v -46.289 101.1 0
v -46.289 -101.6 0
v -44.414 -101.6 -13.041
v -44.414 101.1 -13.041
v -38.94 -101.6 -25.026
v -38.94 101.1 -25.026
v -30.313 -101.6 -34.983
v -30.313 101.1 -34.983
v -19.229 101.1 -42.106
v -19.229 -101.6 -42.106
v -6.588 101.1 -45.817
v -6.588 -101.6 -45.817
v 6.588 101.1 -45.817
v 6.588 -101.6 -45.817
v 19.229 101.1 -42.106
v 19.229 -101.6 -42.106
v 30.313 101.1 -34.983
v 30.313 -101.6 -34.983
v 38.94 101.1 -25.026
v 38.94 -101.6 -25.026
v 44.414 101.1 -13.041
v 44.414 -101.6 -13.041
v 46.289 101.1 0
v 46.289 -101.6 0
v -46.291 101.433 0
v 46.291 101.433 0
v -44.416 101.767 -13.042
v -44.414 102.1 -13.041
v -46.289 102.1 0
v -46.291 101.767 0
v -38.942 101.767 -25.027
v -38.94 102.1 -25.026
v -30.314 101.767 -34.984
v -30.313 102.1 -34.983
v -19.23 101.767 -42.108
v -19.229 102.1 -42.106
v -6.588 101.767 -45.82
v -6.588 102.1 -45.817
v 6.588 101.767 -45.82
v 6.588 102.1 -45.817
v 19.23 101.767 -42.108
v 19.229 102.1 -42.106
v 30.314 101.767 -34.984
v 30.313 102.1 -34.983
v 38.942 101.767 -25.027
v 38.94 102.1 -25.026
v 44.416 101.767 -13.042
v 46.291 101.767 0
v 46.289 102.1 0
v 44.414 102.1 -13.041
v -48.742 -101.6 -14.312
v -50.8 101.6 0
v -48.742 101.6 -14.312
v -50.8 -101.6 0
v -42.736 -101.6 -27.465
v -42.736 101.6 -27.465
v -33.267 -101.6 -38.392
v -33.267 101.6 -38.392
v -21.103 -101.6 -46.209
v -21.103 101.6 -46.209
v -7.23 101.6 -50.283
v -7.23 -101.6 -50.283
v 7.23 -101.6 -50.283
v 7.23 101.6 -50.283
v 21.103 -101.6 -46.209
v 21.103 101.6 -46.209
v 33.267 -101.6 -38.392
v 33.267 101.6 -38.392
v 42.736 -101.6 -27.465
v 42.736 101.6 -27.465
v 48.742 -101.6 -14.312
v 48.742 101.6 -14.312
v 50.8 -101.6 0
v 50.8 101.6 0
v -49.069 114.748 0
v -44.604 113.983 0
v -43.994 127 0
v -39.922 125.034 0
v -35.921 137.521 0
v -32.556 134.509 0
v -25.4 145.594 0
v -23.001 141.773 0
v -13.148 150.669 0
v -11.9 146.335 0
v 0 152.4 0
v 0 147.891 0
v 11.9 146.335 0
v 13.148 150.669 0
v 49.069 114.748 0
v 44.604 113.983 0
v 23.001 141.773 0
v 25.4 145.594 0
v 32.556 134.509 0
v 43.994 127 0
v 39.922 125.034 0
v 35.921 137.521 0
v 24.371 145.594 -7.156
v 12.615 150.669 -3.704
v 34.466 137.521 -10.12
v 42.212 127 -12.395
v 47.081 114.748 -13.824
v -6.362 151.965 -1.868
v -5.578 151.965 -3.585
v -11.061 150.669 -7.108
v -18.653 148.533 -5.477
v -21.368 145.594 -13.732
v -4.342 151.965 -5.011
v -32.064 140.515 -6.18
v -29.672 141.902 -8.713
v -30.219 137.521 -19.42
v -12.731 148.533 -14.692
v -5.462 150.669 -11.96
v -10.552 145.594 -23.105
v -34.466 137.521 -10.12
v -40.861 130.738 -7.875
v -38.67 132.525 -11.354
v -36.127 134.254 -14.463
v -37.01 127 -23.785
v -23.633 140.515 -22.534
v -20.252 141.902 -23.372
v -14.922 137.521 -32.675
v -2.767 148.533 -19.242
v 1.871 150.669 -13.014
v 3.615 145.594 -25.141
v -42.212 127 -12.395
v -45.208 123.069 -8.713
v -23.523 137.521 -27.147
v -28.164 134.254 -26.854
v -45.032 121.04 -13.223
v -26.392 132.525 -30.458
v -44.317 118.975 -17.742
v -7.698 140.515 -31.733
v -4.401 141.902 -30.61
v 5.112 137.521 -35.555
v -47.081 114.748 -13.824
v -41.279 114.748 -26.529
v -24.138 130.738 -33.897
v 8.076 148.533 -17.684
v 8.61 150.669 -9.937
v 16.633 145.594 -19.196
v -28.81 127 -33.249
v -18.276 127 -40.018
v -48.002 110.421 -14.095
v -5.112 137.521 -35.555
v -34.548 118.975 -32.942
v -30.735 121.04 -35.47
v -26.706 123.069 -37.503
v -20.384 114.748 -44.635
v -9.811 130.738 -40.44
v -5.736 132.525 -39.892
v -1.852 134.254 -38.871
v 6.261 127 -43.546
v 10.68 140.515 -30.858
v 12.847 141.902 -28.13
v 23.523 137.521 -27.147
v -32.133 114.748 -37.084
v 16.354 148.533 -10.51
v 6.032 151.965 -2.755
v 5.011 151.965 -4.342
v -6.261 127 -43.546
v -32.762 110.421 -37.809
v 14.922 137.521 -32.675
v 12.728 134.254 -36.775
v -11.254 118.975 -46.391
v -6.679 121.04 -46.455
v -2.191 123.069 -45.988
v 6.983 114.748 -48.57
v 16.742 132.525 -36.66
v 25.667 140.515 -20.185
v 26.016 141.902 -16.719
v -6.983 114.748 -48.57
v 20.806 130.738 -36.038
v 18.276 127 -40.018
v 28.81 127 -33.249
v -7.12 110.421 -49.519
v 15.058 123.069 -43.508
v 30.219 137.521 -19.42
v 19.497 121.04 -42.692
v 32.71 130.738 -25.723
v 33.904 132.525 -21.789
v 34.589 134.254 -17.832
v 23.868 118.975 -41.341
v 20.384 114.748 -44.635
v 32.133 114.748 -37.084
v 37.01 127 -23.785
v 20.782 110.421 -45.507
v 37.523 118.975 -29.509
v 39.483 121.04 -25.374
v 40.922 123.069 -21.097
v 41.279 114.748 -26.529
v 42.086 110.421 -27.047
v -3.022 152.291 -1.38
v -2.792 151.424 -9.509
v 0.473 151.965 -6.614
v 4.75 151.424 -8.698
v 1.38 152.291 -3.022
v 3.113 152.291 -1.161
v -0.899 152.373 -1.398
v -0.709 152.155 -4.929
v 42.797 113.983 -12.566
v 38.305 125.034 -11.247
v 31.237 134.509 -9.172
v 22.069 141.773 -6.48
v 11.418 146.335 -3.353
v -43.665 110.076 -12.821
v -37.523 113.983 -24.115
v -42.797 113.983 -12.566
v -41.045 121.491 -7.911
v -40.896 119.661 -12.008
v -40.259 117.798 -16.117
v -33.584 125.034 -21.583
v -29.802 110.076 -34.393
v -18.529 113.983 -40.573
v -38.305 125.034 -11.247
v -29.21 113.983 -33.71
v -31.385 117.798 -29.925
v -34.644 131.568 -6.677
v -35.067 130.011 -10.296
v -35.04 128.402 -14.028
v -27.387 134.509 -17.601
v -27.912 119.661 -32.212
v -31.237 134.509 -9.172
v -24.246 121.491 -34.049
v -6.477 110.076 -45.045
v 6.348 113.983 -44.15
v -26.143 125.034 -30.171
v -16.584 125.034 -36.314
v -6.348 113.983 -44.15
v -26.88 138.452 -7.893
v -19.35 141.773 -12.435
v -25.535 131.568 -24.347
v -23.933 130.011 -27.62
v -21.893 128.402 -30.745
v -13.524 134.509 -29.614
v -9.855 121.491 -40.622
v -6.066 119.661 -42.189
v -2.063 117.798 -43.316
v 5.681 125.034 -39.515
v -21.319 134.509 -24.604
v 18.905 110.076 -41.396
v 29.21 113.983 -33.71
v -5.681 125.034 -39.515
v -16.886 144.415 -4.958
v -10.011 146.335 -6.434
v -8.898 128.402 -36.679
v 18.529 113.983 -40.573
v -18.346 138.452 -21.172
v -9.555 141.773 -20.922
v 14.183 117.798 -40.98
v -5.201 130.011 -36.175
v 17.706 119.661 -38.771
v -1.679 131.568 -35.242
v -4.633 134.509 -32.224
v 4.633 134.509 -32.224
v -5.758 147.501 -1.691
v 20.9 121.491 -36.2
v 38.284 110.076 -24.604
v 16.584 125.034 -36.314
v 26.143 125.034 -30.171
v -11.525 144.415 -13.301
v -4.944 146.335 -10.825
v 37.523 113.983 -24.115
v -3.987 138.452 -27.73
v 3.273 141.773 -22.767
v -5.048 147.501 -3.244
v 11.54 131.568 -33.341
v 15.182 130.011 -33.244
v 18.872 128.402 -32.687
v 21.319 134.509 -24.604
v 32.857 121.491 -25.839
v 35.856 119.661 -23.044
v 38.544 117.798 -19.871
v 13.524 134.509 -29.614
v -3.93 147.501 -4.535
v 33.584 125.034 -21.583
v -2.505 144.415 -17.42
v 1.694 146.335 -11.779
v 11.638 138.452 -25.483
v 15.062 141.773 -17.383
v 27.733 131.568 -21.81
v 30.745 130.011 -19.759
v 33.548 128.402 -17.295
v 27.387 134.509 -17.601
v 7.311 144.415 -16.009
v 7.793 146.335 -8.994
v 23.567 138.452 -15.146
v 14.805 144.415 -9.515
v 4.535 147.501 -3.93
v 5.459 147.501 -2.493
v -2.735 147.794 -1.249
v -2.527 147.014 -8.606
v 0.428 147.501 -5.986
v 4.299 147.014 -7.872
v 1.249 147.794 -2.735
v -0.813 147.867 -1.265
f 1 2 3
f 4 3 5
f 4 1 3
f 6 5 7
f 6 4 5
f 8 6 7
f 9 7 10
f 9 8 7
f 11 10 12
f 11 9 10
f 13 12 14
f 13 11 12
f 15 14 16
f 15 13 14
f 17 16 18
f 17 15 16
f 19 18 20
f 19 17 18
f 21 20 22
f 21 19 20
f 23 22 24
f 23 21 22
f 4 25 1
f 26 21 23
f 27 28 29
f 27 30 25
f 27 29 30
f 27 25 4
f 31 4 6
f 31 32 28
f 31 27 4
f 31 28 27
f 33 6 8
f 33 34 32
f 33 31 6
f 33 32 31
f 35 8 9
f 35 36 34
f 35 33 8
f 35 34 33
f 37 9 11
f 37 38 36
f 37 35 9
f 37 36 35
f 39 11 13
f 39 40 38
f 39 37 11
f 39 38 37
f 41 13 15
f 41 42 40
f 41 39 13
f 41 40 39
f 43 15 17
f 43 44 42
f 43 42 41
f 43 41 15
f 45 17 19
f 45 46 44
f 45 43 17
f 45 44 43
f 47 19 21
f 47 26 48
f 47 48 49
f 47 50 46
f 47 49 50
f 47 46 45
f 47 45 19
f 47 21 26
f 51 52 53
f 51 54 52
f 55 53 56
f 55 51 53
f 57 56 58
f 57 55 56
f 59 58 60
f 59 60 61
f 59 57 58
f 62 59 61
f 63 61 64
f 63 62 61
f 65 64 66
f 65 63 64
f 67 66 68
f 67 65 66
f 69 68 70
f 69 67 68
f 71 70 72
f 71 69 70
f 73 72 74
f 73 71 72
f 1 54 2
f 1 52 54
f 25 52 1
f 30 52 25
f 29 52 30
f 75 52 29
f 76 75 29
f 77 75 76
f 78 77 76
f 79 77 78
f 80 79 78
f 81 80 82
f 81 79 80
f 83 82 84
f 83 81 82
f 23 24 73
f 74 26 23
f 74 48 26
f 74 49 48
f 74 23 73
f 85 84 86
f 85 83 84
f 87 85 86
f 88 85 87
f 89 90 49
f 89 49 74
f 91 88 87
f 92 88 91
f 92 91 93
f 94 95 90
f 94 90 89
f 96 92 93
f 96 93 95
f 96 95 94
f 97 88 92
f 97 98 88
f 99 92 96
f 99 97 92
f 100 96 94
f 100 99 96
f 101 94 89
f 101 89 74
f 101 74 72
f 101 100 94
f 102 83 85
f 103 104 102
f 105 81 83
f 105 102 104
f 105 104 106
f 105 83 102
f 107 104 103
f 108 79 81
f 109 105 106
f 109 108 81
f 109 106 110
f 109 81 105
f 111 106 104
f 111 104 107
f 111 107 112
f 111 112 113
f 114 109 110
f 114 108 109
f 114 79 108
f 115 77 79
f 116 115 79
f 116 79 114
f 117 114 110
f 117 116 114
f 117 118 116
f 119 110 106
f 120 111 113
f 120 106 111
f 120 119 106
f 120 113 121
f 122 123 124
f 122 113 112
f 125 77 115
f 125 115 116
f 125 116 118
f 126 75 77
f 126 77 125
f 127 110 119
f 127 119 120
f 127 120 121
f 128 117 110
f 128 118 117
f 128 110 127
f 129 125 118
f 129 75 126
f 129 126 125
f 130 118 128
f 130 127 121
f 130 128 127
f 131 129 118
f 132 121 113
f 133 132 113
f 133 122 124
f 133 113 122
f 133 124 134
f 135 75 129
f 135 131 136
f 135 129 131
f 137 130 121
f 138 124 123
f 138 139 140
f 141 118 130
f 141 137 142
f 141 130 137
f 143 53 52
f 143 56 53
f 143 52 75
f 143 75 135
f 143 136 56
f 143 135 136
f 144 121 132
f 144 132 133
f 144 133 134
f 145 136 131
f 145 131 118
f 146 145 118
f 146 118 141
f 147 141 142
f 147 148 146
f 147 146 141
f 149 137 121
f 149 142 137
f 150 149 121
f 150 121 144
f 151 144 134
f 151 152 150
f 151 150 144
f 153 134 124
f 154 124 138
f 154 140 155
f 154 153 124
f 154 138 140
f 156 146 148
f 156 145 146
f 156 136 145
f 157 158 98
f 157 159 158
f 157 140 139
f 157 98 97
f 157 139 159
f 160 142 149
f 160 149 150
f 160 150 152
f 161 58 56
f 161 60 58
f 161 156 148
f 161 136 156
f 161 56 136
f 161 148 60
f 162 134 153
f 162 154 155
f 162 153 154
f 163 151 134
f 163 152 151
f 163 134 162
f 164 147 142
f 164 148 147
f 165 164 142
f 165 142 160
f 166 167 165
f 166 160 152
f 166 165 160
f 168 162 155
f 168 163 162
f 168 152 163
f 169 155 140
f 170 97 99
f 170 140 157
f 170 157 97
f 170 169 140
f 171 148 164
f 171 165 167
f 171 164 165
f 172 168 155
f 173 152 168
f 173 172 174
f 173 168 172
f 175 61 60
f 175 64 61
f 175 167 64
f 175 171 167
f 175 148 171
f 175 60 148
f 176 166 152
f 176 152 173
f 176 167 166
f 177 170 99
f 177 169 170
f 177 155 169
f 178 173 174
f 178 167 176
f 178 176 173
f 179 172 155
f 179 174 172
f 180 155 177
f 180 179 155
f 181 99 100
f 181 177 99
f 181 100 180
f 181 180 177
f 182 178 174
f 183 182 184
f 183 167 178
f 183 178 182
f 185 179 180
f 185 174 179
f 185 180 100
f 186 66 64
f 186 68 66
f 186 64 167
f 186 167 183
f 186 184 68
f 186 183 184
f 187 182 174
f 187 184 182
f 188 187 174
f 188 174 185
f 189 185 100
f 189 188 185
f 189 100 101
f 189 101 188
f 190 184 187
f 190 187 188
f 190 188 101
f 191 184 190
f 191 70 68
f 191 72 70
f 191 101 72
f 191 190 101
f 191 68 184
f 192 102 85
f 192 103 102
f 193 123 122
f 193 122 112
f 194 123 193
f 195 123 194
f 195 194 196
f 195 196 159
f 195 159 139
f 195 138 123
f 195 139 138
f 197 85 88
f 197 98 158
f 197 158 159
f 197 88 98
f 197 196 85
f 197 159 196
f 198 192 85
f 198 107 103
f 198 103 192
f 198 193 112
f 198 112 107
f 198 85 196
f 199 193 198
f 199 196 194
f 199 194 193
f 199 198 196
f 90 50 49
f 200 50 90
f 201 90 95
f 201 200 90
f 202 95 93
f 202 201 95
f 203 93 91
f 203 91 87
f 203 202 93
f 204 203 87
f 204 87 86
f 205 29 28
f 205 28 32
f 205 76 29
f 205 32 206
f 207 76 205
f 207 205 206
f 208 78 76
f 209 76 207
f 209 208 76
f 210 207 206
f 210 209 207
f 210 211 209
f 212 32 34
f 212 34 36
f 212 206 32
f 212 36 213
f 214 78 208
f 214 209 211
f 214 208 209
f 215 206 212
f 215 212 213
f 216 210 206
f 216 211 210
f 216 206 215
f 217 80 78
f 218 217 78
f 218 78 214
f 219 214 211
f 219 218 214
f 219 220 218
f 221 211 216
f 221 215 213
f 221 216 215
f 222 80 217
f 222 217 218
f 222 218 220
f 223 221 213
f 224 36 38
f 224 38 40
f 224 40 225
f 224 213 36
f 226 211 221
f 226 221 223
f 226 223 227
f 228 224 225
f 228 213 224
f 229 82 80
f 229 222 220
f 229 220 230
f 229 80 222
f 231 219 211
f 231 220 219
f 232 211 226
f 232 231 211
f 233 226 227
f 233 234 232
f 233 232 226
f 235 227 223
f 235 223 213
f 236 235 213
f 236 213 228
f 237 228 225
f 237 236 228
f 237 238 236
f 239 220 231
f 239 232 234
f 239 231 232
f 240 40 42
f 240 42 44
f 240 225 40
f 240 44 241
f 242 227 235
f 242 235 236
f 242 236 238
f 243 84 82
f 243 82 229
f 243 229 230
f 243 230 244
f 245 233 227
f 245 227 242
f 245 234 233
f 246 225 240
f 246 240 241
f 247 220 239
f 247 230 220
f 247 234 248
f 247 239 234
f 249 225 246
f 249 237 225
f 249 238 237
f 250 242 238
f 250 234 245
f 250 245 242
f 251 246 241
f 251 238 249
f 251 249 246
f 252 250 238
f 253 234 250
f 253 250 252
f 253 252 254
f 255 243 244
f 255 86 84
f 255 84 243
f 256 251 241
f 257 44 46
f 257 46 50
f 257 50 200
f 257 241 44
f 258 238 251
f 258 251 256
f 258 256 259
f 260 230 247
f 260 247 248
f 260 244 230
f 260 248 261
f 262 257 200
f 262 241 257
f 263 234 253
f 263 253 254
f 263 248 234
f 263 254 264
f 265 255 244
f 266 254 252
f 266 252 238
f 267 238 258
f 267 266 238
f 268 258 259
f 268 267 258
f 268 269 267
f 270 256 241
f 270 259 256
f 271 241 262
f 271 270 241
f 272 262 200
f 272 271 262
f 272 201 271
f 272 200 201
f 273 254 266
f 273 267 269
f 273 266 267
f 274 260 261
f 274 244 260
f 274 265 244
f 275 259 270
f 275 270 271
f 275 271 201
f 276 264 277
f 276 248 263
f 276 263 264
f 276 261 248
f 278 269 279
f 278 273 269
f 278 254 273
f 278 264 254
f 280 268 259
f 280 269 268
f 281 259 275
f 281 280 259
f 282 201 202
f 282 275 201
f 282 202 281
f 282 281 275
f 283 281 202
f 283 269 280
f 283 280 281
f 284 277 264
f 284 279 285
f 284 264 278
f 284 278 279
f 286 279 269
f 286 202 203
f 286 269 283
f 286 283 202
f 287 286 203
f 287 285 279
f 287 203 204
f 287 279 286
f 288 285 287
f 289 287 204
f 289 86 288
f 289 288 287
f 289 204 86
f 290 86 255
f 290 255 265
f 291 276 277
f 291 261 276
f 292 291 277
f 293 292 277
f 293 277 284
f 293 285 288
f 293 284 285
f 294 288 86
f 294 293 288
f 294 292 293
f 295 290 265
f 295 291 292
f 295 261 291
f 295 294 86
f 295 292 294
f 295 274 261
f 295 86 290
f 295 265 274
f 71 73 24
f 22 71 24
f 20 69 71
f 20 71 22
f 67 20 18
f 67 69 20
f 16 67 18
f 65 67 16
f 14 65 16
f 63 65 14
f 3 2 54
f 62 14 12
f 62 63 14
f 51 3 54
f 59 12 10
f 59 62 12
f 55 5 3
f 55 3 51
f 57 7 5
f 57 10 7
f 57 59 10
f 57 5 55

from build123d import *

# Parameters (mm, degrees)
F1_ANGLE = 180


with BuildPart() as f1:
    # F0 (on Top) → F1 (revolve)
    with BuildSketch(Plane.XY):
        with BuildLine():
            Line((-50.8, -101.6), (-46.288617, -101.6))
            Line((-46.288617, -101.6), (-46.288617, 101.09959))
            ThreePointArc((-46.288617, 101.09959), (-46.291322, 101.6), (-46.288617, 102.10041))
            ThreePointArc((-46.288617, 102.10041), (-32.555505, 134.509353), (0, 147.891322))
            Line((0, 147.891322), (0, 152.4))
            ThreePointArc((0, 152.4), (-35.921024, 137.521024), (-50.8, 101.6))
            Line((-50.8, 101.6), (-50.8, -101.6))
        make_face()
    revolve(axis=Axis((0, 0, 0), (0, -1, 0)), revolution_arc=F1_ANGLE)


solid = f1.part
